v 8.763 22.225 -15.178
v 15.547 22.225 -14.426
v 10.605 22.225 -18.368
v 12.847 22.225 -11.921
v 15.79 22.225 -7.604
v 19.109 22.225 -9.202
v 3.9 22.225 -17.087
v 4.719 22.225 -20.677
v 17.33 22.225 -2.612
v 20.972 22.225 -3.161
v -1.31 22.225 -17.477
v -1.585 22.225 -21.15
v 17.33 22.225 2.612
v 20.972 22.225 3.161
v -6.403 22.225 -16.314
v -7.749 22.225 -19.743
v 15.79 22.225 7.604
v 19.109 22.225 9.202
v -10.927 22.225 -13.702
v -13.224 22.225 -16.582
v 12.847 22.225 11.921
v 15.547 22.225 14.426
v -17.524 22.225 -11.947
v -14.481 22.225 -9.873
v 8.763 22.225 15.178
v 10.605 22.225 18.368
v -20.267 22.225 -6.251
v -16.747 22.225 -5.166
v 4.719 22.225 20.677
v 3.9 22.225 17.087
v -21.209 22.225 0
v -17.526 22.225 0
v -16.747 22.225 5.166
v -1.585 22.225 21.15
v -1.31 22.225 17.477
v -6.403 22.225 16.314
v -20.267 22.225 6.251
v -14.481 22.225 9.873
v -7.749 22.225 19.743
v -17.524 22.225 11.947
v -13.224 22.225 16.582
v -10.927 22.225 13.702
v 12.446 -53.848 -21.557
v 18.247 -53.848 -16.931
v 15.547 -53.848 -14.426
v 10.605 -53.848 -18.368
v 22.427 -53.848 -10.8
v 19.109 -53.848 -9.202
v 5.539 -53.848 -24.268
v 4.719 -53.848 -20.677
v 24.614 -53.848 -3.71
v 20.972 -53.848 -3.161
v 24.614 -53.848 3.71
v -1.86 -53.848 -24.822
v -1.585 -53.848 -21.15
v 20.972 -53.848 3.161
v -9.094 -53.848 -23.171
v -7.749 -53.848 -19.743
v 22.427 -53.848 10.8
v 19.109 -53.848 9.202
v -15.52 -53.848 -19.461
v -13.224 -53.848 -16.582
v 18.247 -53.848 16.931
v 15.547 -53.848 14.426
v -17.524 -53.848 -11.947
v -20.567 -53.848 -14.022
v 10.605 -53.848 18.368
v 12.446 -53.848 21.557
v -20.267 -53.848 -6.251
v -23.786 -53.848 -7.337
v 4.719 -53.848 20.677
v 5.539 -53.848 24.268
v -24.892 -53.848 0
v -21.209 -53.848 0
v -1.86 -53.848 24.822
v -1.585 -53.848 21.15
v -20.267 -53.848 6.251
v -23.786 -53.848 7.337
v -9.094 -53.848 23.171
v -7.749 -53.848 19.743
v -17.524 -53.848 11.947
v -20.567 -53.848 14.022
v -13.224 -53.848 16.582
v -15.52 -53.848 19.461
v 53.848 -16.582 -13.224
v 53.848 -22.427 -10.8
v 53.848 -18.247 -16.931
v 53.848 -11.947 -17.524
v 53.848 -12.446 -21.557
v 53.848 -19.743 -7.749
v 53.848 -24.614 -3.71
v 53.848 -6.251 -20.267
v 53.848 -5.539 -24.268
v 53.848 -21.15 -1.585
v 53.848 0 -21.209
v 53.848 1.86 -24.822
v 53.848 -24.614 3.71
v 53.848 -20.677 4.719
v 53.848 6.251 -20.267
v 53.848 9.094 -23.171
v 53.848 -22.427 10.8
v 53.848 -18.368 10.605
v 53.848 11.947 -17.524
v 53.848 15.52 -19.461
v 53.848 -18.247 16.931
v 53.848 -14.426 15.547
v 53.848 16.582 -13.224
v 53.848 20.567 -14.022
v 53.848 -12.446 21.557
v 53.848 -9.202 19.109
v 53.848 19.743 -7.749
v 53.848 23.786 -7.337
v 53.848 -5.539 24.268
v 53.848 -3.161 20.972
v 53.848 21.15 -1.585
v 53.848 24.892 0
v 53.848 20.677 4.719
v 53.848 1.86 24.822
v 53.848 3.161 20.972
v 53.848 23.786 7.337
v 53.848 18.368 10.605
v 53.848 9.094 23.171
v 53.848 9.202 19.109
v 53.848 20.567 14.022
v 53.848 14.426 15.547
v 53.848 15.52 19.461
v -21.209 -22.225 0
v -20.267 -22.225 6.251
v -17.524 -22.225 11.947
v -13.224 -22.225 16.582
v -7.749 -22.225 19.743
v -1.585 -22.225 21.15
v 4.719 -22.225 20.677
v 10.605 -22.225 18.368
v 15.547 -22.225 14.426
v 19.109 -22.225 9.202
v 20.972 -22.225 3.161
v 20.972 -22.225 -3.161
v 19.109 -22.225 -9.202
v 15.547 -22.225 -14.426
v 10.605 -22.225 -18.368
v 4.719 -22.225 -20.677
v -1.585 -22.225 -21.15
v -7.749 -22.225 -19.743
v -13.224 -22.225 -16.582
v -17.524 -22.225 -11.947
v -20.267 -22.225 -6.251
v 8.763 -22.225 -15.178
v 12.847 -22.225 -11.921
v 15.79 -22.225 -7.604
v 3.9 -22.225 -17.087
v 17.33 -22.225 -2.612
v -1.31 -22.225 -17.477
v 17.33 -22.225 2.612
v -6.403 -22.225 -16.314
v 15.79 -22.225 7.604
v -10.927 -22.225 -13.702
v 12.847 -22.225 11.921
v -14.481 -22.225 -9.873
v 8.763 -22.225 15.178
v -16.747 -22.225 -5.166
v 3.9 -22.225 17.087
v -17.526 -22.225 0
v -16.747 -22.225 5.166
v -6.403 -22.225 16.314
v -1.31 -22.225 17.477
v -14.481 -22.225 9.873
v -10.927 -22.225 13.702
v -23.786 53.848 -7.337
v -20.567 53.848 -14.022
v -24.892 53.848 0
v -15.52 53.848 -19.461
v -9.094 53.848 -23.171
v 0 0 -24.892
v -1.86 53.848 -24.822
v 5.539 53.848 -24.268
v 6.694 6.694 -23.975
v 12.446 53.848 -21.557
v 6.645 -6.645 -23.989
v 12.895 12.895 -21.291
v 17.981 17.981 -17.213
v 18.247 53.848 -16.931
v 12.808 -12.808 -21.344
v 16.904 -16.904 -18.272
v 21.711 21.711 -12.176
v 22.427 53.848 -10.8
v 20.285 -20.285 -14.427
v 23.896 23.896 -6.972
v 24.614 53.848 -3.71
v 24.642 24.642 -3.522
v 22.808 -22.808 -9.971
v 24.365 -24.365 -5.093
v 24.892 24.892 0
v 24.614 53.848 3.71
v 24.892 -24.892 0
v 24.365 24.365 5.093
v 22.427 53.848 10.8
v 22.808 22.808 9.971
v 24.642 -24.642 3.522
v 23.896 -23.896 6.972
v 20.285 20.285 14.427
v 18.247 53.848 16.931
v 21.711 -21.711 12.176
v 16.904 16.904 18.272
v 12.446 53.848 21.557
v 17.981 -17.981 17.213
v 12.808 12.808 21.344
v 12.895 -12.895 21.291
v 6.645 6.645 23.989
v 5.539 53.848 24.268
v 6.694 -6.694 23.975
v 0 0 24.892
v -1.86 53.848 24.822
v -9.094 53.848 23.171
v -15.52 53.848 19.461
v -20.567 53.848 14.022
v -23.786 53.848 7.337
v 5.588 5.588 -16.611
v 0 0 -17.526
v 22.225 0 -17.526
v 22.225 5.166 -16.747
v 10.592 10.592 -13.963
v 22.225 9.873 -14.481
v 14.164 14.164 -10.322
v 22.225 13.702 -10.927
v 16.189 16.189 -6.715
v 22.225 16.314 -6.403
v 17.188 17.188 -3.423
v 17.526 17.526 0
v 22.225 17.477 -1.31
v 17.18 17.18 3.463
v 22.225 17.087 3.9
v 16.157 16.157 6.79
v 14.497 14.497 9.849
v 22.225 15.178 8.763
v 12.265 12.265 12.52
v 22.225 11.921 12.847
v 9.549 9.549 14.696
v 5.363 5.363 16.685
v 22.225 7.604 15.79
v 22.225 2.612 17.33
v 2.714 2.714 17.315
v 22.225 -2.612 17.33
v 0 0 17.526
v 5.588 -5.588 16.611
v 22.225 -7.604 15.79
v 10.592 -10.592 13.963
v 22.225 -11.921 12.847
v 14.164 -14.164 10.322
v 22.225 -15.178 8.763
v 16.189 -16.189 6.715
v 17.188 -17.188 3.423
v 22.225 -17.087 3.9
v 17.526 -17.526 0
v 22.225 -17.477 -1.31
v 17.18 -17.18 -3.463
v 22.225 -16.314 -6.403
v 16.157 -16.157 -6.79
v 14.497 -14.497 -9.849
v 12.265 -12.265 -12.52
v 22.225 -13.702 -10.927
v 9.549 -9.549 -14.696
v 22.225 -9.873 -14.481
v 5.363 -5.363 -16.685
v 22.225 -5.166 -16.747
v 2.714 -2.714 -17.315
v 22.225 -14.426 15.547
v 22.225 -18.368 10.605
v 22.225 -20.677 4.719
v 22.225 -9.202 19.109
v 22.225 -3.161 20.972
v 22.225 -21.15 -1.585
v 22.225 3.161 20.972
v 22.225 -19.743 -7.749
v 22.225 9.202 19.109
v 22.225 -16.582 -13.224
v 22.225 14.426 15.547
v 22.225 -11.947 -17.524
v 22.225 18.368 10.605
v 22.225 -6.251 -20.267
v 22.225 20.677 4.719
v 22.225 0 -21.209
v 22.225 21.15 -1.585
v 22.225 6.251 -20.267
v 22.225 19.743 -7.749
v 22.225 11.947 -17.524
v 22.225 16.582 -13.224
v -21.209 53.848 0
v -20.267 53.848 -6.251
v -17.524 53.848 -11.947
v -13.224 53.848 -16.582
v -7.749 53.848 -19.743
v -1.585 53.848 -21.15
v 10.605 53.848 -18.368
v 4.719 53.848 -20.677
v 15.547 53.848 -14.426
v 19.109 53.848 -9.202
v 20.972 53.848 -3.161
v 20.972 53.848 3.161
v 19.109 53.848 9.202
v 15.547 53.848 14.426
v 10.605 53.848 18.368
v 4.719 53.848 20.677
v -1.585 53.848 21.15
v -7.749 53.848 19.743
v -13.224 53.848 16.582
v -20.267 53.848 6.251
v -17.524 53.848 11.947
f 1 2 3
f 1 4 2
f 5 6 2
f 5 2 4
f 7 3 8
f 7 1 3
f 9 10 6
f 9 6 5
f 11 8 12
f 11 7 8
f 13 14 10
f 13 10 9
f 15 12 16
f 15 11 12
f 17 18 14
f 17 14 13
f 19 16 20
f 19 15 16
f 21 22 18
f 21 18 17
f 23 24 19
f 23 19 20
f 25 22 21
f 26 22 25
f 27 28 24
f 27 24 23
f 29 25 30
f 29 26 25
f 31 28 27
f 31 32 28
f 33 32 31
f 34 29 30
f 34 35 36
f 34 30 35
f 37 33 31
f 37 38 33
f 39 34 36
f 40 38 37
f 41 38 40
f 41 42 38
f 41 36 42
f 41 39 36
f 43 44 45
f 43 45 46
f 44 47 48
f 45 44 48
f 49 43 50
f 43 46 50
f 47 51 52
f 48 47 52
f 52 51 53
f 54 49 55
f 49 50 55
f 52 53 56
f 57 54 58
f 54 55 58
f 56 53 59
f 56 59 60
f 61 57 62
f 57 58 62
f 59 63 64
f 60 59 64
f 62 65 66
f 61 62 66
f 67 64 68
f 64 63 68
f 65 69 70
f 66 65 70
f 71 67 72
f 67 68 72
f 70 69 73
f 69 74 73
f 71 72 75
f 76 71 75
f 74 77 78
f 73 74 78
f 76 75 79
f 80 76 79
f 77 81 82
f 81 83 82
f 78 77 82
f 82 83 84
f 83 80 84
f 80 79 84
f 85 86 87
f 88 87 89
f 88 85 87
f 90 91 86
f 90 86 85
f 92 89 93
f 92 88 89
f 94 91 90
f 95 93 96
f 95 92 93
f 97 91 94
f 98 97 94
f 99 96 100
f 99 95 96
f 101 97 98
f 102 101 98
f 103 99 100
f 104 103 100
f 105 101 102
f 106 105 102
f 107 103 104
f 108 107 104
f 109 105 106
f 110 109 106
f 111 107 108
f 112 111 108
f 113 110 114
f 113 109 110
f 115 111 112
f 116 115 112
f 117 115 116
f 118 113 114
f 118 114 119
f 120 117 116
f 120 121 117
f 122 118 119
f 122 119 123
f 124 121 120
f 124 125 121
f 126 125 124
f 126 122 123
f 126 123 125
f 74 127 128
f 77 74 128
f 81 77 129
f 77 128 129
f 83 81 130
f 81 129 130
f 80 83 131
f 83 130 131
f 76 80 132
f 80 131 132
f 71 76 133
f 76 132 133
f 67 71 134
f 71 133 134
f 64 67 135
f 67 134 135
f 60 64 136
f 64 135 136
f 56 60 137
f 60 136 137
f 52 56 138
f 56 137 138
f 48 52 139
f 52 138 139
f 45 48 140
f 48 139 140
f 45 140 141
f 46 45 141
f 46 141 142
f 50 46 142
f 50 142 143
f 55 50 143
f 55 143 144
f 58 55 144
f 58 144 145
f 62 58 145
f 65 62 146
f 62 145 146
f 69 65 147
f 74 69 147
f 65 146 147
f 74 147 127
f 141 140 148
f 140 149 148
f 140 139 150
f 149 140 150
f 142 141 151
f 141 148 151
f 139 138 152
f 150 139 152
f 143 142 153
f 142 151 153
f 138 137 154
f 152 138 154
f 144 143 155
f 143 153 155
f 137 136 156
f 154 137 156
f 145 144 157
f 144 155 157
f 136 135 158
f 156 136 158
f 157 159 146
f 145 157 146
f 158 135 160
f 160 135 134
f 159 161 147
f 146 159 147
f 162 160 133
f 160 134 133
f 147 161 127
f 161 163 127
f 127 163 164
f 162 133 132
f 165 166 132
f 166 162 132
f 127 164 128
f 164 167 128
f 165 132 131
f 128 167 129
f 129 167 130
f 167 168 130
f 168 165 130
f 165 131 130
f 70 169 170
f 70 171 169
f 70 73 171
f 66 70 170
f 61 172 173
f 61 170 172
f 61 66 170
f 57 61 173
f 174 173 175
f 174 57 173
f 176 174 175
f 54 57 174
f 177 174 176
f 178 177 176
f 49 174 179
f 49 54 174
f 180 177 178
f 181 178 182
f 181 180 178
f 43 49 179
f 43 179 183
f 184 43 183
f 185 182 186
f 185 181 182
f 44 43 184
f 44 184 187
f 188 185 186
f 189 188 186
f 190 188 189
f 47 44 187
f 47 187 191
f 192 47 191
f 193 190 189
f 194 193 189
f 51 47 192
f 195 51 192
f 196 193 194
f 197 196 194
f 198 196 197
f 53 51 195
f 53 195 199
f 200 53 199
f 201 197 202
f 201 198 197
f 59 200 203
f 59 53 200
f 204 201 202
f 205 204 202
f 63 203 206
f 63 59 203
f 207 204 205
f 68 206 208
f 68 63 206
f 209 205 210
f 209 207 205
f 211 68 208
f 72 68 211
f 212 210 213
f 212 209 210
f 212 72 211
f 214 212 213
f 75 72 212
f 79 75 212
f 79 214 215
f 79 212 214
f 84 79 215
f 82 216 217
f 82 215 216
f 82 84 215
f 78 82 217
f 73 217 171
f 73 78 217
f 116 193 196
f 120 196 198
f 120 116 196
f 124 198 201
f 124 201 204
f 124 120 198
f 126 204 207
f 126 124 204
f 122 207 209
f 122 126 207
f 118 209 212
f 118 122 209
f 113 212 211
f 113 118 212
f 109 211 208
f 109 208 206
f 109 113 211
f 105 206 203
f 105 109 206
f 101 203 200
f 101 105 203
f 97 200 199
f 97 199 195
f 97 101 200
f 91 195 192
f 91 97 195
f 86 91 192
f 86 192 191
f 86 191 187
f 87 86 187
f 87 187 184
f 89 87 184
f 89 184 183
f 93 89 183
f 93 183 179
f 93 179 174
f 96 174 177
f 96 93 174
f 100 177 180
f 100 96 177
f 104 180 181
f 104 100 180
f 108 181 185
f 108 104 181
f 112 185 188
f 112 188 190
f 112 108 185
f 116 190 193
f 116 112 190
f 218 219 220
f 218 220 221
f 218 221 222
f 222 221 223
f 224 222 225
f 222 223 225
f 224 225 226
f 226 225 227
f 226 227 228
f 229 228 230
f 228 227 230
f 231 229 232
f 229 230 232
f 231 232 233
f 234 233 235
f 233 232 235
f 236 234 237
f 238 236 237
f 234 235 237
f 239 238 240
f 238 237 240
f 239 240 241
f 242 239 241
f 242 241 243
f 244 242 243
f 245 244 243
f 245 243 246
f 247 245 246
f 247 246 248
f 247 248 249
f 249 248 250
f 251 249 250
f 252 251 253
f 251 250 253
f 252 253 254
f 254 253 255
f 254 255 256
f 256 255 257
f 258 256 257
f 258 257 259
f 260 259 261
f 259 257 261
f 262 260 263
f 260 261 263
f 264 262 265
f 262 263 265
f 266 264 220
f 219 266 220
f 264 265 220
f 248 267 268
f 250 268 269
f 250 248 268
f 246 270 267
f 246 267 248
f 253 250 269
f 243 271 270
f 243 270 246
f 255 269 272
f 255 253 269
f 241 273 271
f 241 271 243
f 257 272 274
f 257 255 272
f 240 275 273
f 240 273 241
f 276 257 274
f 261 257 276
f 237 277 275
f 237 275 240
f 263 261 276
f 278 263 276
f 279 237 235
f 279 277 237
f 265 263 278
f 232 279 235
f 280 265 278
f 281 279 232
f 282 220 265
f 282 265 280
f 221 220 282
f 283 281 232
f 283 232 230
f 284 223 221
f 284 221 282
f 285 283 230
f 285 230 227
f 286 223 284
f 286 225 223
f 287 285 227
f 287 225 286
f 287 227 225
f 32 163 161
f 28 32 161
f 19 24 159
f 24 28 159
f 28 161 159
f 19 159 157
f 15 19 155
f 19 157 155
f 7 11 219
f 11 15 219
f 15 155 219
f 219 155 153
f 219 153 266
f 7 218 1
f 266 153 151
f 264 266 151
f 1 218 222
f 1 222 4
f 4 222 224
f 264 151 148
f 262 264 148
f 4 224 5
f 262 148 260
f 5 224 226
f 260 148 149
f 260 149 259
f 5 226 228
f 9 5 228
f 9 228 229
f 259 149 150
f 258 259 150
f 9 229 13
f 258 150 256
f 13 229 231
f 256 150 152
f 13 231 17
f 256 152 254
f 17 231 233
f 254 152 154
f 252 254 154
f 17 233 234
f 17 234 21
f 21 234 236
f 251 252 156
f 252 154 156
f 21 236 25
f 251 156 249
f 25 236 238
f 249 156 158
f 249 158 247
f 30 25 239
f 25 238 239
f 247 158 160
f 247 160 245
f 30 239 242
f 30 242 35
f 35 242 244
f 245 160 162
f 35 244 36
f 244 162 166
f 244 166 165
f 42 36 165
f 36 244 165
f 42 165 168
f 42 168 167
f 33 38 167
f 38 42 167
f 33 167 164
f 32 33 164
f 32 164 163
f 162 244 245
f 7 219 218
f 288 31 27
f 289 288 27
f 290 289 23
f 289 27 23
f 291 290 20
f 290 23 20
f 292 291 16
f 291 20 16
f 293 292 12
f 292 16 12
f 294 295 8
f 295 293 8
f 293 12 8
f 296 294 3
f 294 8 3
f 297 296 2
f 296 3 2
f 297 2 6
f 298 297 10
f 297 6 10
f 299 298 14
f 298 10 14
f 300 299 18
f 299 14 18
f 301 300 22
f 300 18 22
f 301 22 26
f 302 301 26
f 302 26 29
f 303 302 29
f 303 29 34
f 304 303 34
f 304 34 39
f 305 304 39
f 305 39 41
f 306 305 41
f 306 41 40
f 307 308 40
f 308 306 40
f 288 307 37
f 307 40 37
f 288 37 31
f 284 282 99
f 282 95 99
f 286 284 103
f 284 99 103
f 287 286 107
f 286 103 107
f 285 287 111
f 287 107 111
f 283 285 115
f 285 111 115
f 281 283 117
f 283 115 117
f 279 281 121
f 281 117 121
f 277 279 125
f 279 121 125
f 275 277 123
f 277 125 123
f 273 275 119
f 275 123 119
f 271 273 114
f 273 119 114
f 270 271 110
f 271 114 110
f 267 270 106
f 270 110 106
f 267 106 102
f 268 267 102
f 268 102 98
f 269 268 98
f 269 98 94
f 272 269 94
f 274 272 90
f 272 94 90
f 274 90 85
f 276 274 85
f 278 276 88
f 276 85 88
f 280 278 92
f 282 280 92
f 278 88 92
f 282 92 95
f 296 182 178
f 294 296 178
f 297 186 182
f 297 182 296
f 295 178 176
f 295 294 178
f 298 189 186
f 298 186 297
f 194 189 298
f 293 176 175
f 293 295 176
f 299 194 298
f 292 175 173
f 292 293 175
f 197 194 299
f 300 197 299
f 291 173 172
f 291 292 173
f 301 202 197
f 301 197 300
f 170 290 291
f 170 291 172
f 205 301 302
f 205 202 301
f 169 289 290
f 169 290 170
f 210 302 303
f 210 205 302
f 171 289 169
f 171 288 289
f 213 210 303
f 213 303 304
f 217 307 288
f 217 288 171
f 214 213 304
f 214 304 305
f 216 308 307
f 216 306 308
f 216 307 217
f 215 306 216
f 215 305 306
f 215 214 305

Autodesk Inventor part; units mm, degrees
ref_plane "XZ Plane" through (0, 0, 0) normal (0, 1, 0) x (-1, 0, 0)
ref_plane "XY Plane" through (0, 0, 0) normal (0, 0, 1) x (1, 0, 0)
sketch "Sketch1" plane through (0, 0, 0) normal (0, 1, 0) x (-1, 0, 0)
  circle A0 centre (0, 0) radius 21.209
  circle A1 centre (0, 0) radius 24.892
  dimension "d0" = 42.418
  dimension "d1" = 49.784
extrude "Extrusion1" add sketch "Sketch1" along normal mid plane 107.696
sketch "Sketch4" plane through (0, 0, 0) normal (0, 1, 0) x (-1, 0, 0)
  circle A0 centre (0, 0) radius 17.526
  circle A1 centre (0, 0) radius 21.209 projected
  circle A2 centre (0, 0) radius 24.892 projected
  dimension "d9" = 35.052
extrude "Extrusion4" add sketch "Sketch4" along normal mid plane 44.45 contours A1
ref_plane "Work Plane1" through (53.848, 0, 0) normal (1, 0, 0) x (0, 1, 0)
sketch "Sketch2" plane through (53.848, 0, 0) normal (1, 0, 0) x (0, 1, 0)
  line L0 (-53.848, 24.892) -> (-53.848, -24.892) projected
  line L1 (53.848, -24.892) -> (53.848, 24.892) projected
  circle A0 centre (0, 0) radius 24.892
  line L2 (-53.848, 24.892) -> (53.848, 24.892) projected
extrude "Extrusion2" add sketch "Sketch2" against normal up to next
sketch "Sketch3" plane through (53.848, 0, 0) normal (1, 0, 0) x (0, 0, -1)
  line L0 (-21.209, -53.848) -> (-21.209, -22.225) projected
  circle A0 centre (0, 0) radius 21.209
extrude "Extrusion3" cut sketch "Sketch3" against normal blind 31.623
sketch "Sketch5" plane through (22.225, 0, 0) normal (1, 0, 0) x (0, 0, -1)
  line L0 (-17.526, -22.225) -> (-17.526, 22.225) projected
  circle A0 centre (0, 0) radius 17.526
extrude "Extrusion5" cut sketch "Sketch5" against normal up to next
properties part number "Piping_Tee_1.25in" material "PVC-Piping"
